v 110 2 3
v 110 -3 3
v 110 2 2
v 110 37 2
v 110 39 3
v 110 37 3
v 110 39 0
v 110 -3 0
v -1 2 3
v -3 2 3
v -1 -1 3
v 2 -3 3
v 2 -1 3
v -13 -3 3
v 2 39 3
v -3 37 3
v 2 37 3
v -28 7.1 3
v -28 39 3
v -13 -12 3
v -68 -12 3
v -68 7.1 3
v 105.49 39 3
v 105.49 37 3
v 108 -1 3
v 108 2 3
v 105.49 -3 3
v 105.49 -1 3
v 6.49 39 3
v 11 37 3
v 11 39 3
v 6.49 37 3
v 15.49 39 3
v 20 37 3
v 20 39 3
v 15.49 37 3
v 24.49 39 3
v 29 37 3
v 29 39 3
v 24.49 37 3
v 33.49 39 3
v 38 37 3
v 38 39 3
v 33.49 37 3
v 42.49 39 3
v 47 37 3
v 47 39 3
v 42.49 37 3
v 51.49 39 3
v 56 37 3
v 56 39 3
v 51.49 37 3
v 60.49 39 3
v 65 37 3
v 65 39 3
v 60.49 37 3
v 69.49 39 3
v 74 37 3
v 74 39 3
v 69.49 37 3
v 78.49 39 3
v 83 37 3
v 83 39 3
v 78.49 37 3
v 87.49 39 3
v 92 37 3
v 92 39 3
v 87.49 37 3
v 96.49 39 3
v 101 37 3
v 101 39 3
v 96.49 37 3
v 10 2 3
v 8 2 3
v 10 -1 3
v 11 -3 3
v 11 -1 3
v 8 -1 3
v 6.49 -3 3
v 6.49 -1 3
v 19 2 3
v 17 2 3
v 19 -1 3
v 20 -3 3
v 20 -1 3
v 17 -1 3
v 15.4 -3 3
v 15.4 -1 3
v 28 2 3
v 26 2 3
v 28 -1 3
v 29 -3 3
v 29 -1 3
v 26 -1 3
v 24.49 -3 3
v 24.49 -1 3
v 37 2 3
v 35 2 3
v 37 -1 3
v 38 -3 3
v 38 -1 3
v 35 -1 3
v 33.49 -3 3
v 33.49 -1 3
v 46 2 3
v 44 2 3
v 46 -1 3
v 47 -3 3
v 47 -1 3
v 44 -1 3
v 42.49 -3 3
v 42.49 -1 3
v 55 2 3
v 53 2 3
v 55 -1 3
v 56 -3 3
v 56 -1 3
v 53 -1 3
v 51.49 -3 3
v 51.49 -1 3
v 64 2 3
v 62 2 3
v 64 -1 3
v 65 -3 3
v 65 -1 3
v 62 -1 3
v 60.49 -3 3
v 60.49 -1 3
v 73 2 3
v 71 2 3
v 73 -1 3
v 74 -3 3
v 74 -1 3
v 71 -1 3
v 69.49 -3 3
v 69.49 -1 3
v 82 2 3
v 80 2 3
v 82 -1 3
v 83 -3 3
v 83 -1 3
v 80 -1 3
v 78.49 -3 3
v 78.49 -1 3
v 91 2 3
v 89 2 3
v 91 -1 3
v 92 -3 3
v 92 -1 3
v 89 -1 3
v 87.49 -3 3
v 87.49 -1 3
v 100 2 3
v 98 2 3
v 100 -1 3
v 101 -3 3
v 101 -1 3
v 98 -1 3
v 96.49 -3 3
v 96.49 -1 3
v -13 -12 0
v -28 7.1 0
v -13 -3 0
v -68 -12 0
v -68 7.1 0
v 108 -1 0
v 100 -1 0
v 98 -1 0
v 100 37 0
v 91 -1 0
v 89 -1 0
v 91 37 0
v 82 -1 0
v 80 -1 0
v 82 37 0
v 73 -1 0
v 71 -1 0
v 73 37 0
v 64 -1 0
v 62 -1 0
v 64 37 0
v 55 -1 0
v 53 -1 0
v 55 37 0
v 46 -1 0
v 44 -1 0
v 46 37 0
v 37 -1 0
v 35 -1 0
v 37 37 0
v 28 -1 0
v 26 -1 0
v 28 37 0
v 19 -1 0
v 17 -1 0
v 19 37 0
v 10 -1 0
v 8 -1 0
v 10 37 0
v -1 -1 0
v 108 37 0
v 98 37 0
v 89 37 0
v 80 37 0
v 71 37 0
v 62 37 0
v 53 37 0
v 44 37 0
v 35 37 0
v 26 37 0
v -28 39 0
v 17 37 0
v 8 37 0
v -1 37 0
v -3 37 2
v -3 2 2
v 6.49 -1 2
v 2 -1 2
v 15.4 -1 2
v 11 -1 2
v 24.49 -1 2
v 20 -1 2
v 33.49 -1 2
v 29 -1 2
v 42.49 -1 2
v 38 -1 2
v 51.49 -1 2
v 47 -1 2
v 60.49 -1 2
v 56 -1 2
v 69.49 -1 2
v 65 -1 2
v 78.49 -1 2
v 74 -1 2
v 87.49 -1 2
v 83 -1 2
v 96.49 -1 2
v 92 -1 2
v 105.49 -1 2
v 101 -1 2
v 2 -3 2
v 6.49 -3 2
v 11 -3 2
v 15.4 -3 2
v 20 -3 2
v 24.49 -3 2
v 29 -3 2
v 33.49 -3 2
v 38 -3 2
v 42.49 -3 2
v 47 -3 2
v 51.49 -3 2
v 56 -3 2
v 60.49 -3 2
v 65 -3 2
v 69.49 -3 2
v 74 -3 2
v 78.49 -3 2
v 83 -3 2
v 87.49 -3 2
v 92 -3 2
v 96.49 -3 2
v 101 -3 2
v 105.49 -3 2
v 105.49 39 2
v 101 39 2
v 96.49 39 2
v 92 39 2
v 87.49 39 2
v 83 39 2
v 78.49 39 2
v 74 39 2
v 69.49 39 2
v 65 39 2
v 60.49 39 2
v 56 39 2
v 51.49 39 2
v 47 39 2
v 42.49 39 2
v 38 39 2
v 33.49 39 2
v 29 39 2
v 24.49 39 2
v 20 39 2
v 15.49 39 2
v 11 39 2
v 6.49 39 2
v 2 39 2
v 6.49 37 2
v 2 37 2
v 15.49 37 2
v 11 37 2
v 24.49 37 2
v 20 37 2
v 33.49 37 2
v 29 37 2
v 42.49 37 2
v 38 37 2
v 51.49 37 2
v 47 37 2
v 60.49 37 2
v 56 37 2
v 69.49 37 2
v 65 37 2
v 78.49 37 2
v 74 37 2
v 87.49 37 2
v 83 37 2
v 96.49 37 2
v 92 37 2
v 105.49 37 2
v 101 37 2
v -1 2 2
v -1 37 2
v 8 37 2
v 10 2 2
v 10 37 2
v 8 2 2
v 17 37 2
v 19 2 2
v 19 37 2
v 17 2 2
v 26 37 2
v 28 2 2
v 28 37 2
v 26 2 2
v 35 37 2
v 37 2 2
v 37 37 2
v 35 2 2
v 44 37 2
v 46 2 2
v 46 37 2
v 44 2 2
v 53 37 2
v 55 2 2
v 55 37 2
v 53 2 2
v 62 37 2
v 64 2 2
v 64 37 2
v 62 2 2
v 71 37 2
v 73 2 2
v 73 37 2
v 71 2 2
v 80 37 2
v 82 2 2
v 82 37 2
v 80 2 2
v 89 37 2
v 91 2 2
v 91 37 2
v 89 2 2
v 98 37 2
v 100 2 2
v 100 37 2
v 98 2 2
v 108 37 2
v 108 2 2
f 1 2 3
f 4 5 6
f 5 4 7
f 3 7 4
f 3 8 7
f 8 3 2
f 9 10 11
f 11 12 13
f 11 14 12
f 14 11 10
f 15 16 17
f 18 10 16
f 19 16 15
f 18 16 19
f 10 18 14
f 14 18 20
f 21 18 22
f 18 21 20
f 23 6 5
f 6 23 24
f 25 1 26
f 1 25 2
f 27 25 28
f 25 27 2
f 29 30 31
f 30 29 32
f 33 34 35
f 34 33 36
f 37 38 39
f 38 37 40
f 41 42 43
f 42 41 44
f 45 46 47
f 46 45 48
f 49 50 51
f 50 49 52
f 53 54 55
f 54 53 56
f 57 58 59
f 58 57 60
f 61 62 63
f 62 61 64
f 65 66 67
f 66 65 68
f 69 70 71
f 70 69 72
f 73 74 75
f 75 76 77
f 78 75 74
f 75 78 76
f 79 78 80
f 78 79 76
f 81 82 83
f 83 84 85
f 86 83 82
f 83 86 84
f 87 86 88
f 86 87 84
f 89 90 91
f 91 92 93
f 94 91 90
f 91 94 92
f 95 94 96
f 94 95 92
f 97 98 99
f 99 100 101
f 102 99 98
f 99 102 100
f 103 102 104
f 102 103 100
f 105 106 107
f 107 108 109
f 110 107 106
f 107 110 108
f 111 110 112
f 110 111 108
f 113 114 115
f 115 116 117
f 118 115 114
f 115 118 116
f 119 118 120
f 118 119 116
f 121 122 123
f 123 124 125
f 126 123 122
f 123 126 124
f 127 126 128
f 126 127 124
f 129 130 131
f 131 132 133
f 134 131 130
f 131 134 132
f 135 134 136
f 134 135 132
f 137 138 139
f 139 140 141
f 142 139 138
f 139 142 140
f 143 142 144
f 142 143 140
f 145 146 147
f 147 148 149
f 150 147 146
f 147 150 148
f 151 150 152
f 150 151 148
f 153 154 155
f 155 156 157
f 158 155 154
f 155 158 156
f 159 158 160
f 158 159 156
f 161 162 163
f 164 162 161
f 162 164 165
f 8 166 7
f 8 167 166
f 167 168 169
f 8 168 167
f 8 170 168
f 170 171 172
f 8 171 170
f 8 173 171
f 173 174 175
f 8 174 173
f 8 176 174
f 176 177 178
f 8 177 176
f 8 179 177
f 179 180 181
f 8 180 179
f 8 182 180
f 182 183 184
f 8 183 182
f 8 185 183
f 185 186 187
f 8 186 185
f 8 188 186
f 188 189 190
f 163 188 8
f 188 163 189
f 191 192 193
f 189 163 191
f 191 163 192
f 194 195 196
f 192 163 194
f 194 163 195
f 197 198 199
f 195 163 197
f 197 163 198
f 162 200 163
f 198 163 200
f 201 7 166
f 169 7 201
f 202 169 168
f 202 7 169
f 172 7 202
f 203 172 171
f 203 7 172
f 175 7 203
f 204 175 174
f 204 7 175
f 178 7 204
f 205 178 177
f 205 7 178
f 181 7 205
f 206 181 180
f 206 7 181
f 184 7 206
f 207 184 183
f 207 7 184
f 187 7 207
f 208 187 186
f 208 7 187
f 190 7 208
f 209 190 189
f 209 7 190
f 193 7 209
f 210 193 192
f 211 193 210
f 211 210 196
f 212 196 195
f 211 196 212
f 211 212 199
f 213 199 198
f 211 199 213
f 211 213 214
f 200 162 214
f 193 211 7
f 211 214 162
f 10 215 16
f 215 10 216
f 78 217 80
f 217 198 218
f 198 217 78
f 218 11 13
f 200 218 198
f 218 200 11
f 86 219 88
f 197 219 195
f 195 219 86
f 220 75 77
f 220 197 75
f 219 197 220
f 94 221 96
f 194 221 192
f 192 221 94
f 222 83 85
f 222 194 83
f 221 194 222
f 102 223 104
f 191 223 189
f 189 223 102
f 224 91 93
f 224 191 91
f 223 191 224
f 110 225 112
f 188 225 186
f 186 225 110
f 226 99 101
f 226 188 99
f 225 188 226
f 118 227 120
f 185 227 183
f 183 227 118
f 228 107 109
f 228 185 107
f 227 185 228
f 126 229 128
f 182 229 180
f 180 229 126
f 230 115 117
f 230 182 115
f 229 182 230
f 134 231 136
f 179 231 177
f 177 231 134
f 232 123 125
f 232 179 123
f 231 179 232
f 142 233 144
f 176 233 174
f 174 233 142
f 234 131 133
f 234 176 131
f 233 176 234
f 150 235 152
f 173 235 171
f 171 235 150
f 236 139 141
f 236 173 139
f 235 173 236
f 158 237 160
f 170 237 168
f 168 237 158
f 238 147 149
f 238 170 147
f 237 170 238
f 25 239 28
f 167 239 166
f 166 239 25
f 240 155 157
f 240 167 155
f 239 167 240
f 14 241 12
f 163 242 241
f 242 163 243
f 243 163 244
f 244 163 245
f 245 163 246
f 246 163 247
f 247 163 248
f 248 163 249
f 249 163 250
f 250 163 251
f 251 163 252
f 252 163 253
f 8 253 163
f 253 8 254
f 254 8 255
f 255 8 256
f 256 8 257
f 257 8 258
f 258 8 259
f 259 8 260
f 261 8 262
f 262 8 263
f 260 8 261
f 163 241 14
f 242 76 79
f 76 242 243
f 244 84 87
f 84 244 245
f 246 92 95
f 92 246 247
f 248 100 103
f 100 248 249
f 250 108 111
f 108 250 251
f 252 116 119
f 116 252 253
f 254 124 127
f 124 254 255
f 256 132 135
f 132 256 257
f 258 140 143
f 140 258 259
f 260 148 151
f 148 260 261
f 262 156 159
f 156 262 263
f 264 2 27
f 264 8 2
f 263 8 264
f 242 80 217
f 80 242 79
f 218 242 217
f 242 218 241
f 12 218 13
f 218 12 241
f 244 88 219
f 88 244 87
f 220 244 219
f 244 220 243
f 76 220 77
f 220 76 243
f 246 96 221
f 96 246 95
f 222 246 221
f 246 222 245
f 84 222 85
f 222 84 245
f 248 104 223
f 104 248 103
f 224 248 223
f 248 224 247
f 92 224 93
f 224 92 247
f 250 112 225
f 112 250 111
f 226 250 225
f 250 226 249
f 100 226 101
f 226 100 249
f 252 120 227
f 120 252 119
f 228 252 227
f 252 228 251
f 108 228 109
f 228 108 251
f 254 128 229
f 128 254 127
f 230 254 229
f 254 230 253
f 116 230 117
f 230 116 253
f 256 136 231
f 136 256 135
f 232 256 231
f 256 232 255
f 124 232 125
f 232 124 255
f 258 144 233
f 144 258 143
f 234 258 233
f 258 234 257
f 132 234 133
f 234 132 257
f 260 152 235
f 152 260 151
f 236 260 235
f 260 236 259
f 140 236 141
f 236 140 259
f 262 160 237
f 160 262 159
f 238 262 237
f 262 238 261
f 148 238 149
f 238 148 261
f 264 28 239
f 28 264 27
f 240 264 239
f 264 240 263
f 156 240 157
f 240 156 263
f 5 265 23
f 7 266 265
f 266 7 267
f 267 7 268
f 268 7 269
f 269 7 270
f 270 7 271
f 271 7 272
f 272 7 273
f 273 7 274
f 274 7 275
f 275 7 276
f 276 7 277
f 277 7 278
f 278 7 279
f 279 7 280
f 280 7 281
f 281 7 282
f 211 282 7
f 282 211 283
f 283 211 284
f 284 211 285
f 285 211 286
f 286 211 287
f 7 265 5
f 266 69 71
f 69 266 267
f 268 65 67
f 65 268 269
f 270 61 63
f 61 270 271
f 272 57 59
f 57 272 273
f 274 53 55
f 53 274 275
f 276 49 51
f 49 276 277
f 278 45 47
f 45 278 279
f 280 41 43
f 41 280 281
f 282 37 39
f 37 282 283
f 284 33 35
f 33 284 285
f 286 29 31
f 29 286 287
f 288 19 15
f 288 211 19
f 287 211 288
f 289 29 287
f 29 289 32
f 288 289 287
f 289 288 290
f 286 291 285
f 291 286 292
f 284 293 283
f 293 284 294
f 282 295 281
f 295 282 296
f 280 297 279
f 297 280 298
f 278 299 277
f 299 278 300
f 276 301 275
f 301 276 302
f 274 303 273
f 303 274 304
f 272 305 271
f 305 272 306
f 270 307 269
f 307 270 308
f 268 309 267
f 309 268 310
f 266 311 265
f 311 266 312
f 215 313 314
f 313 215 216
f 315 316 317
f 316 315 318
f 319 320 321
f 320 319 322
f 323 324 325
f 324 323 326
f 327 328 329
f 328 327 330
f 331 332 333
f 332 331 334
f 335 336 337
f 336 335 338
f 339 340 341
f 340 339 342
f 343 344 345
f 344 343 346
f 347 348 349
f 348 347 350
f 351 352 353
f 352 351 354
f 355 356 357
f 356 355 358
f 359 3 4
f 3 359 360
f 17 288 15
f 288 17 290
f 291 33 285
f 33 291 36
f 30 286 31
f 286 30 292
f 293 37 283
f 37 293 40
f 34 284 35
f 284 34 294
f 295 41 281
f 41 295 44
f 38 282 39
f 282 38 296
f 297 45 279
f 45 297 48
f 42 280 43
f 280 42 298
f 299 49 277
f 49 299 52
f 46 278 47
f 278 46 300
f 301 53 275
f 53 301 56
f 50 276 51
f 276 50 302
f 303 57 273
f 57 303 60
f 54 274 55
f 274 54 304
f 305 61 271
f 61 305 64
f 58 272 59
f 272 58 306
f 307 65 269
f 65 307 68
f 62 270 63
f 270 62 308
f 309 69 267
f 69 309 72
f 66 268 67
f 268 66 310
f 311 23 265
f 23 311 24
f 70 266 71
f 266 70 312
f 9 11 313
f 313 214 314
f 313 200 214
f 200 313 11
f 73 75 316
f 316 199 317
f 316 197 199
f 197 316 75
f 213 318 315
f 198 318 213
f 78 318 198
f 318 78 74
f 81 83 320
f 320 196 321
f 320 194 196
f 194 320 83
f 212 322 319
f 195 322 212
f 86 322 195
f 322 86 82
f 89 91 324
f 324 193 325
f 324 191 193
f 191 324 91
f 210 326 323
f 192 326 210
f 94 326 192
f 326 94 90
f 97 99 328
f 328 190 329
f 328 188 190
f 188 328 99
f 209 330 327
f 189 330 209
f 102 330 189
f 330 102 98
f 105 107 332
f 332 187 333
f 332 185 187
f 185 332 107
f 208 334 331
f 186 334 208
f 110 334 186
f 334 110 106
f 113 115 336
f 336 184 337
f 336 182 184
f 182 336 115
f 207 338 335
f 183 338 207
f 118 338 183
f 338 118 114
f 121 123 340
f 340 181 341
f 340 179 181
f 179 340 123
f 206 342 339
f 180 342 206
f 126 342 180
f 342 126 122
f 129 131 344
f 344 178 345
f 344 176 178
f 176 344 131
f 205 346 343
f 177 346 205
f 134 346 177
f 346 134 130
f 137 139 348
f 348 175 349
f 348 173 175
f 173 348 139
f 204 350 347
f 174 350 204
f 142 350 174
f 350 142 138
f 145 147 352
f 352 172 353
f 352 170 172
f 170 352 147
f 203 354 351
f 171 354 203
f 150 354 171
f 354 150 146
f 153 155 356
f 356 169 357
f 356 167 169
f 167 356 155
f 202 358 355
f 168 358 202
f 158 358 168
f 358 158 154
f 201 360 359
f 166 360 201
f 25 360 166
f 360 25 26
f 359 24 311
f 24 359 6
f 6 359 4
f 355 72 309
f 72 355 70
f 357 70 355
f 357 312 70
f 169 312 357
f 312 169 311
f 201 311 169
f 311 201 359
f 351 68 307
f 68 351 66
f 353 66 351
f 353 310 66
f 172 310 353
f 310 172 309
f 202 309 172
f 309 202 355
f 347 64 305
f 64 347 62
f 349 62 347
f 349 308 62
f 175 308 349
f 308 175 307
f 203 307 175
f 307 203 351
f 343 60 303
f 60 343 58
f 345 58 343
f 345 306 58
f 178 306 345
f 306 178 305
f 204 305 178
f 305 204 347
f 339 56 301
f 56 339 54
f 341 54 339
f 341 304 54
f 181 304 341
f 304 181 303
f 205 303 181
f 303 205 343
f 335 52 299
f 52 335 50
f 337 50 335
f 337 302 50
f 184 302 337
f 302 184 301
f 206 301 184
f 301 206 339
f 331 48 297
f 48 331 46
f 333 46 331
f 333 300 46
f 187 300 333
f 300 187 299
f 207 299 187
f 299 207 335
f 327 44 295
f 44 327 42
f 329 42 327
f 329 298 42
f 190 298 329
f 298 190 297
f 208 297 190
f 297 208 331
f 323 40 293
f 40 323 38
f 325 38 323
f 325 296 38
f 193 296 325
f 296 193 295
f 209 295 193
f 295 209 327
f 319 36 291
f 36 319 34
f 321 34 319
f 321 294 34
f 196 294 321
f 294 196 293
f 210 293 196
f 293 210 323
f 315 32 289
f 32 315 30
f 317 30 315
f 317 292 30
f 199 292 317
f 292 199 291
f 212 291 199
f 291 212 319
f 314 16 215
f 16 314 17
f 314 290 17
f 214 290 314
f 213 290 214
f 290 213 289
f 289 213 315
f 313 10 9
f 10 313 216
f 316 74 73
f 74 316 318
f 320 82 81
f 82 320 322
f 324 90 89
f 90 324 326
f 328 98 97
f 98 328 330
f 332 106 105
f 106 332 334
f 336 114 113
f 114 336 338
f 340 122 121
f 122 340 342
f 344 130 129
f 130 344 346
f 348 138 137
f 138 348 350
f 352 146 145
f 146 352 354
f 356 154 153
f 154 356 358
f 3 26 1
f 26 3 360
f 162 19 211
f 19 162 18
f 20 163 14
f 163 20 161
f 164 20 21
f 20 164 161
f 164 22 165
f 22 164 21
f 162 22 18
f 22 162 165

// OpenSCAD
difference(){
union(){
difference () {
union () {


difference () {
translate ([-3,-3,0])cube ([113, 2, 3]);


translate ([2,-75,2])cube ([4.49,95,3]);

translate ([11,-5,2])cube ([4.4,20,3]);
    translate ([20,-5,2])cube ([4.49,20,3]);
    translate ([29,-5,2])cube ([4.49,20,3]);
    translate ([38,-5,2])cube ([4.49,20,3]);
    translate ([47,-5,2])cube ([4.49,20,3]);
    translate ([56,-5,2])cube ([4.49,20,3]);
    translate ([65,-5,2])cube ([4.49,20,3]);
    translate ([74,-5,2])cube ([4.49,20,3]);
    translate ([83,-5,2])cube ([4.49,20,3]);
    translate ([92,-5,2])cube ([4.49,20,3]);
    translate ([101,-5,2])cube ([4.49,20,3]);

}


difference () {
translate ([-3,15,0])cube ([113, 24, 3]);


translate ([2,5,2])cube ([4.49,38,5]);

translate ([11,5,2])cube ([4.49,38,5]);
    translate ([20,5,2])cube ([4.49,38,3]);
    translate ([29,5,2])cube ([4.49,38,3]);
    translate ([38,5,2])cube ([4.49,38,3]);
    translate ([47,5,2])cube ([4.49,38,3]);
    translate ([56,5,2])cube ([4.49,38,3]);
    translate ([65,5,2])cube ([4.49,38,3]);
    translate ([74,5,2])cube ([4.49,38,3]);
    translate ([83,5,2])cube ([4.49,38,3]);
    translate ([92,5,2])cube ([4.49,38,3]);
    translate ([101,5,2])cube ([4.49,38,3]);
}

    translate ([-3,-3,0]) cube ([2,42,3]);
 translate ([8,-3,0]) cube ([2,42,3]);
 translate ([17,-3,0]) cube ([2,42,3]);
   translate ([26,-3,0]) cube ([2,42,3]);
 translate ([35,-3,0]) cube ([2,42,3]);
 translate ([44,-3,0]) cube ([2,42,3]);
translate ([53,-3,0]) cube ([2,42,3]);
 translate ([62,-3,0]) cube ([2,42,3]);
 translate ([71,-3,0]) cube ([2,42,3]);
   translate ([80,-3,0]) cube ([2,42,3]);
 translate ([89,-3,0]) cube ([2,42,3]);
 translate ([98,-3,0]) cube ([2,42,3]);
translate ([108,-3,0]) cube ([2,42,3]);

}

translate ([-5,2,2]) cube ([120,35,3]);

}

}

translate ([-1,-1,0])cube ([9,38,3]);
translate ([10,-1,0])cube ([7,38,3]);
translate ([19,-1,0])cube ([7,38,3]);
translate ([28,-1,0])cube ([7,38,3]);
translate ([37,-1,0])cube ([7,38,3]);
translate ([46,-1,0])cube ([7,38,3]);
translate ([55,-1,0])cube ([7,38,3]);
translate ([64,-1,0])cube ([7,38,3]);
translate ([73,-1,0])cube ([7,38,3]);
translate ([82,-1,0])cube ([7,38,3]);
translate ([91,-1,0])cube ([7,38,3]);
translate ([100,-1,0])cube ([8,38,3]);

}

translate ([-28,-3,0])cube ([25, 42, 3]);


translate ([-28,-12,0])cube ([15, 17, 3]);
translate ([-28,5,0])cube ([15, 17, 3]);


translate ([-68,-12,0])cube ([40, 19.1, 3]);
